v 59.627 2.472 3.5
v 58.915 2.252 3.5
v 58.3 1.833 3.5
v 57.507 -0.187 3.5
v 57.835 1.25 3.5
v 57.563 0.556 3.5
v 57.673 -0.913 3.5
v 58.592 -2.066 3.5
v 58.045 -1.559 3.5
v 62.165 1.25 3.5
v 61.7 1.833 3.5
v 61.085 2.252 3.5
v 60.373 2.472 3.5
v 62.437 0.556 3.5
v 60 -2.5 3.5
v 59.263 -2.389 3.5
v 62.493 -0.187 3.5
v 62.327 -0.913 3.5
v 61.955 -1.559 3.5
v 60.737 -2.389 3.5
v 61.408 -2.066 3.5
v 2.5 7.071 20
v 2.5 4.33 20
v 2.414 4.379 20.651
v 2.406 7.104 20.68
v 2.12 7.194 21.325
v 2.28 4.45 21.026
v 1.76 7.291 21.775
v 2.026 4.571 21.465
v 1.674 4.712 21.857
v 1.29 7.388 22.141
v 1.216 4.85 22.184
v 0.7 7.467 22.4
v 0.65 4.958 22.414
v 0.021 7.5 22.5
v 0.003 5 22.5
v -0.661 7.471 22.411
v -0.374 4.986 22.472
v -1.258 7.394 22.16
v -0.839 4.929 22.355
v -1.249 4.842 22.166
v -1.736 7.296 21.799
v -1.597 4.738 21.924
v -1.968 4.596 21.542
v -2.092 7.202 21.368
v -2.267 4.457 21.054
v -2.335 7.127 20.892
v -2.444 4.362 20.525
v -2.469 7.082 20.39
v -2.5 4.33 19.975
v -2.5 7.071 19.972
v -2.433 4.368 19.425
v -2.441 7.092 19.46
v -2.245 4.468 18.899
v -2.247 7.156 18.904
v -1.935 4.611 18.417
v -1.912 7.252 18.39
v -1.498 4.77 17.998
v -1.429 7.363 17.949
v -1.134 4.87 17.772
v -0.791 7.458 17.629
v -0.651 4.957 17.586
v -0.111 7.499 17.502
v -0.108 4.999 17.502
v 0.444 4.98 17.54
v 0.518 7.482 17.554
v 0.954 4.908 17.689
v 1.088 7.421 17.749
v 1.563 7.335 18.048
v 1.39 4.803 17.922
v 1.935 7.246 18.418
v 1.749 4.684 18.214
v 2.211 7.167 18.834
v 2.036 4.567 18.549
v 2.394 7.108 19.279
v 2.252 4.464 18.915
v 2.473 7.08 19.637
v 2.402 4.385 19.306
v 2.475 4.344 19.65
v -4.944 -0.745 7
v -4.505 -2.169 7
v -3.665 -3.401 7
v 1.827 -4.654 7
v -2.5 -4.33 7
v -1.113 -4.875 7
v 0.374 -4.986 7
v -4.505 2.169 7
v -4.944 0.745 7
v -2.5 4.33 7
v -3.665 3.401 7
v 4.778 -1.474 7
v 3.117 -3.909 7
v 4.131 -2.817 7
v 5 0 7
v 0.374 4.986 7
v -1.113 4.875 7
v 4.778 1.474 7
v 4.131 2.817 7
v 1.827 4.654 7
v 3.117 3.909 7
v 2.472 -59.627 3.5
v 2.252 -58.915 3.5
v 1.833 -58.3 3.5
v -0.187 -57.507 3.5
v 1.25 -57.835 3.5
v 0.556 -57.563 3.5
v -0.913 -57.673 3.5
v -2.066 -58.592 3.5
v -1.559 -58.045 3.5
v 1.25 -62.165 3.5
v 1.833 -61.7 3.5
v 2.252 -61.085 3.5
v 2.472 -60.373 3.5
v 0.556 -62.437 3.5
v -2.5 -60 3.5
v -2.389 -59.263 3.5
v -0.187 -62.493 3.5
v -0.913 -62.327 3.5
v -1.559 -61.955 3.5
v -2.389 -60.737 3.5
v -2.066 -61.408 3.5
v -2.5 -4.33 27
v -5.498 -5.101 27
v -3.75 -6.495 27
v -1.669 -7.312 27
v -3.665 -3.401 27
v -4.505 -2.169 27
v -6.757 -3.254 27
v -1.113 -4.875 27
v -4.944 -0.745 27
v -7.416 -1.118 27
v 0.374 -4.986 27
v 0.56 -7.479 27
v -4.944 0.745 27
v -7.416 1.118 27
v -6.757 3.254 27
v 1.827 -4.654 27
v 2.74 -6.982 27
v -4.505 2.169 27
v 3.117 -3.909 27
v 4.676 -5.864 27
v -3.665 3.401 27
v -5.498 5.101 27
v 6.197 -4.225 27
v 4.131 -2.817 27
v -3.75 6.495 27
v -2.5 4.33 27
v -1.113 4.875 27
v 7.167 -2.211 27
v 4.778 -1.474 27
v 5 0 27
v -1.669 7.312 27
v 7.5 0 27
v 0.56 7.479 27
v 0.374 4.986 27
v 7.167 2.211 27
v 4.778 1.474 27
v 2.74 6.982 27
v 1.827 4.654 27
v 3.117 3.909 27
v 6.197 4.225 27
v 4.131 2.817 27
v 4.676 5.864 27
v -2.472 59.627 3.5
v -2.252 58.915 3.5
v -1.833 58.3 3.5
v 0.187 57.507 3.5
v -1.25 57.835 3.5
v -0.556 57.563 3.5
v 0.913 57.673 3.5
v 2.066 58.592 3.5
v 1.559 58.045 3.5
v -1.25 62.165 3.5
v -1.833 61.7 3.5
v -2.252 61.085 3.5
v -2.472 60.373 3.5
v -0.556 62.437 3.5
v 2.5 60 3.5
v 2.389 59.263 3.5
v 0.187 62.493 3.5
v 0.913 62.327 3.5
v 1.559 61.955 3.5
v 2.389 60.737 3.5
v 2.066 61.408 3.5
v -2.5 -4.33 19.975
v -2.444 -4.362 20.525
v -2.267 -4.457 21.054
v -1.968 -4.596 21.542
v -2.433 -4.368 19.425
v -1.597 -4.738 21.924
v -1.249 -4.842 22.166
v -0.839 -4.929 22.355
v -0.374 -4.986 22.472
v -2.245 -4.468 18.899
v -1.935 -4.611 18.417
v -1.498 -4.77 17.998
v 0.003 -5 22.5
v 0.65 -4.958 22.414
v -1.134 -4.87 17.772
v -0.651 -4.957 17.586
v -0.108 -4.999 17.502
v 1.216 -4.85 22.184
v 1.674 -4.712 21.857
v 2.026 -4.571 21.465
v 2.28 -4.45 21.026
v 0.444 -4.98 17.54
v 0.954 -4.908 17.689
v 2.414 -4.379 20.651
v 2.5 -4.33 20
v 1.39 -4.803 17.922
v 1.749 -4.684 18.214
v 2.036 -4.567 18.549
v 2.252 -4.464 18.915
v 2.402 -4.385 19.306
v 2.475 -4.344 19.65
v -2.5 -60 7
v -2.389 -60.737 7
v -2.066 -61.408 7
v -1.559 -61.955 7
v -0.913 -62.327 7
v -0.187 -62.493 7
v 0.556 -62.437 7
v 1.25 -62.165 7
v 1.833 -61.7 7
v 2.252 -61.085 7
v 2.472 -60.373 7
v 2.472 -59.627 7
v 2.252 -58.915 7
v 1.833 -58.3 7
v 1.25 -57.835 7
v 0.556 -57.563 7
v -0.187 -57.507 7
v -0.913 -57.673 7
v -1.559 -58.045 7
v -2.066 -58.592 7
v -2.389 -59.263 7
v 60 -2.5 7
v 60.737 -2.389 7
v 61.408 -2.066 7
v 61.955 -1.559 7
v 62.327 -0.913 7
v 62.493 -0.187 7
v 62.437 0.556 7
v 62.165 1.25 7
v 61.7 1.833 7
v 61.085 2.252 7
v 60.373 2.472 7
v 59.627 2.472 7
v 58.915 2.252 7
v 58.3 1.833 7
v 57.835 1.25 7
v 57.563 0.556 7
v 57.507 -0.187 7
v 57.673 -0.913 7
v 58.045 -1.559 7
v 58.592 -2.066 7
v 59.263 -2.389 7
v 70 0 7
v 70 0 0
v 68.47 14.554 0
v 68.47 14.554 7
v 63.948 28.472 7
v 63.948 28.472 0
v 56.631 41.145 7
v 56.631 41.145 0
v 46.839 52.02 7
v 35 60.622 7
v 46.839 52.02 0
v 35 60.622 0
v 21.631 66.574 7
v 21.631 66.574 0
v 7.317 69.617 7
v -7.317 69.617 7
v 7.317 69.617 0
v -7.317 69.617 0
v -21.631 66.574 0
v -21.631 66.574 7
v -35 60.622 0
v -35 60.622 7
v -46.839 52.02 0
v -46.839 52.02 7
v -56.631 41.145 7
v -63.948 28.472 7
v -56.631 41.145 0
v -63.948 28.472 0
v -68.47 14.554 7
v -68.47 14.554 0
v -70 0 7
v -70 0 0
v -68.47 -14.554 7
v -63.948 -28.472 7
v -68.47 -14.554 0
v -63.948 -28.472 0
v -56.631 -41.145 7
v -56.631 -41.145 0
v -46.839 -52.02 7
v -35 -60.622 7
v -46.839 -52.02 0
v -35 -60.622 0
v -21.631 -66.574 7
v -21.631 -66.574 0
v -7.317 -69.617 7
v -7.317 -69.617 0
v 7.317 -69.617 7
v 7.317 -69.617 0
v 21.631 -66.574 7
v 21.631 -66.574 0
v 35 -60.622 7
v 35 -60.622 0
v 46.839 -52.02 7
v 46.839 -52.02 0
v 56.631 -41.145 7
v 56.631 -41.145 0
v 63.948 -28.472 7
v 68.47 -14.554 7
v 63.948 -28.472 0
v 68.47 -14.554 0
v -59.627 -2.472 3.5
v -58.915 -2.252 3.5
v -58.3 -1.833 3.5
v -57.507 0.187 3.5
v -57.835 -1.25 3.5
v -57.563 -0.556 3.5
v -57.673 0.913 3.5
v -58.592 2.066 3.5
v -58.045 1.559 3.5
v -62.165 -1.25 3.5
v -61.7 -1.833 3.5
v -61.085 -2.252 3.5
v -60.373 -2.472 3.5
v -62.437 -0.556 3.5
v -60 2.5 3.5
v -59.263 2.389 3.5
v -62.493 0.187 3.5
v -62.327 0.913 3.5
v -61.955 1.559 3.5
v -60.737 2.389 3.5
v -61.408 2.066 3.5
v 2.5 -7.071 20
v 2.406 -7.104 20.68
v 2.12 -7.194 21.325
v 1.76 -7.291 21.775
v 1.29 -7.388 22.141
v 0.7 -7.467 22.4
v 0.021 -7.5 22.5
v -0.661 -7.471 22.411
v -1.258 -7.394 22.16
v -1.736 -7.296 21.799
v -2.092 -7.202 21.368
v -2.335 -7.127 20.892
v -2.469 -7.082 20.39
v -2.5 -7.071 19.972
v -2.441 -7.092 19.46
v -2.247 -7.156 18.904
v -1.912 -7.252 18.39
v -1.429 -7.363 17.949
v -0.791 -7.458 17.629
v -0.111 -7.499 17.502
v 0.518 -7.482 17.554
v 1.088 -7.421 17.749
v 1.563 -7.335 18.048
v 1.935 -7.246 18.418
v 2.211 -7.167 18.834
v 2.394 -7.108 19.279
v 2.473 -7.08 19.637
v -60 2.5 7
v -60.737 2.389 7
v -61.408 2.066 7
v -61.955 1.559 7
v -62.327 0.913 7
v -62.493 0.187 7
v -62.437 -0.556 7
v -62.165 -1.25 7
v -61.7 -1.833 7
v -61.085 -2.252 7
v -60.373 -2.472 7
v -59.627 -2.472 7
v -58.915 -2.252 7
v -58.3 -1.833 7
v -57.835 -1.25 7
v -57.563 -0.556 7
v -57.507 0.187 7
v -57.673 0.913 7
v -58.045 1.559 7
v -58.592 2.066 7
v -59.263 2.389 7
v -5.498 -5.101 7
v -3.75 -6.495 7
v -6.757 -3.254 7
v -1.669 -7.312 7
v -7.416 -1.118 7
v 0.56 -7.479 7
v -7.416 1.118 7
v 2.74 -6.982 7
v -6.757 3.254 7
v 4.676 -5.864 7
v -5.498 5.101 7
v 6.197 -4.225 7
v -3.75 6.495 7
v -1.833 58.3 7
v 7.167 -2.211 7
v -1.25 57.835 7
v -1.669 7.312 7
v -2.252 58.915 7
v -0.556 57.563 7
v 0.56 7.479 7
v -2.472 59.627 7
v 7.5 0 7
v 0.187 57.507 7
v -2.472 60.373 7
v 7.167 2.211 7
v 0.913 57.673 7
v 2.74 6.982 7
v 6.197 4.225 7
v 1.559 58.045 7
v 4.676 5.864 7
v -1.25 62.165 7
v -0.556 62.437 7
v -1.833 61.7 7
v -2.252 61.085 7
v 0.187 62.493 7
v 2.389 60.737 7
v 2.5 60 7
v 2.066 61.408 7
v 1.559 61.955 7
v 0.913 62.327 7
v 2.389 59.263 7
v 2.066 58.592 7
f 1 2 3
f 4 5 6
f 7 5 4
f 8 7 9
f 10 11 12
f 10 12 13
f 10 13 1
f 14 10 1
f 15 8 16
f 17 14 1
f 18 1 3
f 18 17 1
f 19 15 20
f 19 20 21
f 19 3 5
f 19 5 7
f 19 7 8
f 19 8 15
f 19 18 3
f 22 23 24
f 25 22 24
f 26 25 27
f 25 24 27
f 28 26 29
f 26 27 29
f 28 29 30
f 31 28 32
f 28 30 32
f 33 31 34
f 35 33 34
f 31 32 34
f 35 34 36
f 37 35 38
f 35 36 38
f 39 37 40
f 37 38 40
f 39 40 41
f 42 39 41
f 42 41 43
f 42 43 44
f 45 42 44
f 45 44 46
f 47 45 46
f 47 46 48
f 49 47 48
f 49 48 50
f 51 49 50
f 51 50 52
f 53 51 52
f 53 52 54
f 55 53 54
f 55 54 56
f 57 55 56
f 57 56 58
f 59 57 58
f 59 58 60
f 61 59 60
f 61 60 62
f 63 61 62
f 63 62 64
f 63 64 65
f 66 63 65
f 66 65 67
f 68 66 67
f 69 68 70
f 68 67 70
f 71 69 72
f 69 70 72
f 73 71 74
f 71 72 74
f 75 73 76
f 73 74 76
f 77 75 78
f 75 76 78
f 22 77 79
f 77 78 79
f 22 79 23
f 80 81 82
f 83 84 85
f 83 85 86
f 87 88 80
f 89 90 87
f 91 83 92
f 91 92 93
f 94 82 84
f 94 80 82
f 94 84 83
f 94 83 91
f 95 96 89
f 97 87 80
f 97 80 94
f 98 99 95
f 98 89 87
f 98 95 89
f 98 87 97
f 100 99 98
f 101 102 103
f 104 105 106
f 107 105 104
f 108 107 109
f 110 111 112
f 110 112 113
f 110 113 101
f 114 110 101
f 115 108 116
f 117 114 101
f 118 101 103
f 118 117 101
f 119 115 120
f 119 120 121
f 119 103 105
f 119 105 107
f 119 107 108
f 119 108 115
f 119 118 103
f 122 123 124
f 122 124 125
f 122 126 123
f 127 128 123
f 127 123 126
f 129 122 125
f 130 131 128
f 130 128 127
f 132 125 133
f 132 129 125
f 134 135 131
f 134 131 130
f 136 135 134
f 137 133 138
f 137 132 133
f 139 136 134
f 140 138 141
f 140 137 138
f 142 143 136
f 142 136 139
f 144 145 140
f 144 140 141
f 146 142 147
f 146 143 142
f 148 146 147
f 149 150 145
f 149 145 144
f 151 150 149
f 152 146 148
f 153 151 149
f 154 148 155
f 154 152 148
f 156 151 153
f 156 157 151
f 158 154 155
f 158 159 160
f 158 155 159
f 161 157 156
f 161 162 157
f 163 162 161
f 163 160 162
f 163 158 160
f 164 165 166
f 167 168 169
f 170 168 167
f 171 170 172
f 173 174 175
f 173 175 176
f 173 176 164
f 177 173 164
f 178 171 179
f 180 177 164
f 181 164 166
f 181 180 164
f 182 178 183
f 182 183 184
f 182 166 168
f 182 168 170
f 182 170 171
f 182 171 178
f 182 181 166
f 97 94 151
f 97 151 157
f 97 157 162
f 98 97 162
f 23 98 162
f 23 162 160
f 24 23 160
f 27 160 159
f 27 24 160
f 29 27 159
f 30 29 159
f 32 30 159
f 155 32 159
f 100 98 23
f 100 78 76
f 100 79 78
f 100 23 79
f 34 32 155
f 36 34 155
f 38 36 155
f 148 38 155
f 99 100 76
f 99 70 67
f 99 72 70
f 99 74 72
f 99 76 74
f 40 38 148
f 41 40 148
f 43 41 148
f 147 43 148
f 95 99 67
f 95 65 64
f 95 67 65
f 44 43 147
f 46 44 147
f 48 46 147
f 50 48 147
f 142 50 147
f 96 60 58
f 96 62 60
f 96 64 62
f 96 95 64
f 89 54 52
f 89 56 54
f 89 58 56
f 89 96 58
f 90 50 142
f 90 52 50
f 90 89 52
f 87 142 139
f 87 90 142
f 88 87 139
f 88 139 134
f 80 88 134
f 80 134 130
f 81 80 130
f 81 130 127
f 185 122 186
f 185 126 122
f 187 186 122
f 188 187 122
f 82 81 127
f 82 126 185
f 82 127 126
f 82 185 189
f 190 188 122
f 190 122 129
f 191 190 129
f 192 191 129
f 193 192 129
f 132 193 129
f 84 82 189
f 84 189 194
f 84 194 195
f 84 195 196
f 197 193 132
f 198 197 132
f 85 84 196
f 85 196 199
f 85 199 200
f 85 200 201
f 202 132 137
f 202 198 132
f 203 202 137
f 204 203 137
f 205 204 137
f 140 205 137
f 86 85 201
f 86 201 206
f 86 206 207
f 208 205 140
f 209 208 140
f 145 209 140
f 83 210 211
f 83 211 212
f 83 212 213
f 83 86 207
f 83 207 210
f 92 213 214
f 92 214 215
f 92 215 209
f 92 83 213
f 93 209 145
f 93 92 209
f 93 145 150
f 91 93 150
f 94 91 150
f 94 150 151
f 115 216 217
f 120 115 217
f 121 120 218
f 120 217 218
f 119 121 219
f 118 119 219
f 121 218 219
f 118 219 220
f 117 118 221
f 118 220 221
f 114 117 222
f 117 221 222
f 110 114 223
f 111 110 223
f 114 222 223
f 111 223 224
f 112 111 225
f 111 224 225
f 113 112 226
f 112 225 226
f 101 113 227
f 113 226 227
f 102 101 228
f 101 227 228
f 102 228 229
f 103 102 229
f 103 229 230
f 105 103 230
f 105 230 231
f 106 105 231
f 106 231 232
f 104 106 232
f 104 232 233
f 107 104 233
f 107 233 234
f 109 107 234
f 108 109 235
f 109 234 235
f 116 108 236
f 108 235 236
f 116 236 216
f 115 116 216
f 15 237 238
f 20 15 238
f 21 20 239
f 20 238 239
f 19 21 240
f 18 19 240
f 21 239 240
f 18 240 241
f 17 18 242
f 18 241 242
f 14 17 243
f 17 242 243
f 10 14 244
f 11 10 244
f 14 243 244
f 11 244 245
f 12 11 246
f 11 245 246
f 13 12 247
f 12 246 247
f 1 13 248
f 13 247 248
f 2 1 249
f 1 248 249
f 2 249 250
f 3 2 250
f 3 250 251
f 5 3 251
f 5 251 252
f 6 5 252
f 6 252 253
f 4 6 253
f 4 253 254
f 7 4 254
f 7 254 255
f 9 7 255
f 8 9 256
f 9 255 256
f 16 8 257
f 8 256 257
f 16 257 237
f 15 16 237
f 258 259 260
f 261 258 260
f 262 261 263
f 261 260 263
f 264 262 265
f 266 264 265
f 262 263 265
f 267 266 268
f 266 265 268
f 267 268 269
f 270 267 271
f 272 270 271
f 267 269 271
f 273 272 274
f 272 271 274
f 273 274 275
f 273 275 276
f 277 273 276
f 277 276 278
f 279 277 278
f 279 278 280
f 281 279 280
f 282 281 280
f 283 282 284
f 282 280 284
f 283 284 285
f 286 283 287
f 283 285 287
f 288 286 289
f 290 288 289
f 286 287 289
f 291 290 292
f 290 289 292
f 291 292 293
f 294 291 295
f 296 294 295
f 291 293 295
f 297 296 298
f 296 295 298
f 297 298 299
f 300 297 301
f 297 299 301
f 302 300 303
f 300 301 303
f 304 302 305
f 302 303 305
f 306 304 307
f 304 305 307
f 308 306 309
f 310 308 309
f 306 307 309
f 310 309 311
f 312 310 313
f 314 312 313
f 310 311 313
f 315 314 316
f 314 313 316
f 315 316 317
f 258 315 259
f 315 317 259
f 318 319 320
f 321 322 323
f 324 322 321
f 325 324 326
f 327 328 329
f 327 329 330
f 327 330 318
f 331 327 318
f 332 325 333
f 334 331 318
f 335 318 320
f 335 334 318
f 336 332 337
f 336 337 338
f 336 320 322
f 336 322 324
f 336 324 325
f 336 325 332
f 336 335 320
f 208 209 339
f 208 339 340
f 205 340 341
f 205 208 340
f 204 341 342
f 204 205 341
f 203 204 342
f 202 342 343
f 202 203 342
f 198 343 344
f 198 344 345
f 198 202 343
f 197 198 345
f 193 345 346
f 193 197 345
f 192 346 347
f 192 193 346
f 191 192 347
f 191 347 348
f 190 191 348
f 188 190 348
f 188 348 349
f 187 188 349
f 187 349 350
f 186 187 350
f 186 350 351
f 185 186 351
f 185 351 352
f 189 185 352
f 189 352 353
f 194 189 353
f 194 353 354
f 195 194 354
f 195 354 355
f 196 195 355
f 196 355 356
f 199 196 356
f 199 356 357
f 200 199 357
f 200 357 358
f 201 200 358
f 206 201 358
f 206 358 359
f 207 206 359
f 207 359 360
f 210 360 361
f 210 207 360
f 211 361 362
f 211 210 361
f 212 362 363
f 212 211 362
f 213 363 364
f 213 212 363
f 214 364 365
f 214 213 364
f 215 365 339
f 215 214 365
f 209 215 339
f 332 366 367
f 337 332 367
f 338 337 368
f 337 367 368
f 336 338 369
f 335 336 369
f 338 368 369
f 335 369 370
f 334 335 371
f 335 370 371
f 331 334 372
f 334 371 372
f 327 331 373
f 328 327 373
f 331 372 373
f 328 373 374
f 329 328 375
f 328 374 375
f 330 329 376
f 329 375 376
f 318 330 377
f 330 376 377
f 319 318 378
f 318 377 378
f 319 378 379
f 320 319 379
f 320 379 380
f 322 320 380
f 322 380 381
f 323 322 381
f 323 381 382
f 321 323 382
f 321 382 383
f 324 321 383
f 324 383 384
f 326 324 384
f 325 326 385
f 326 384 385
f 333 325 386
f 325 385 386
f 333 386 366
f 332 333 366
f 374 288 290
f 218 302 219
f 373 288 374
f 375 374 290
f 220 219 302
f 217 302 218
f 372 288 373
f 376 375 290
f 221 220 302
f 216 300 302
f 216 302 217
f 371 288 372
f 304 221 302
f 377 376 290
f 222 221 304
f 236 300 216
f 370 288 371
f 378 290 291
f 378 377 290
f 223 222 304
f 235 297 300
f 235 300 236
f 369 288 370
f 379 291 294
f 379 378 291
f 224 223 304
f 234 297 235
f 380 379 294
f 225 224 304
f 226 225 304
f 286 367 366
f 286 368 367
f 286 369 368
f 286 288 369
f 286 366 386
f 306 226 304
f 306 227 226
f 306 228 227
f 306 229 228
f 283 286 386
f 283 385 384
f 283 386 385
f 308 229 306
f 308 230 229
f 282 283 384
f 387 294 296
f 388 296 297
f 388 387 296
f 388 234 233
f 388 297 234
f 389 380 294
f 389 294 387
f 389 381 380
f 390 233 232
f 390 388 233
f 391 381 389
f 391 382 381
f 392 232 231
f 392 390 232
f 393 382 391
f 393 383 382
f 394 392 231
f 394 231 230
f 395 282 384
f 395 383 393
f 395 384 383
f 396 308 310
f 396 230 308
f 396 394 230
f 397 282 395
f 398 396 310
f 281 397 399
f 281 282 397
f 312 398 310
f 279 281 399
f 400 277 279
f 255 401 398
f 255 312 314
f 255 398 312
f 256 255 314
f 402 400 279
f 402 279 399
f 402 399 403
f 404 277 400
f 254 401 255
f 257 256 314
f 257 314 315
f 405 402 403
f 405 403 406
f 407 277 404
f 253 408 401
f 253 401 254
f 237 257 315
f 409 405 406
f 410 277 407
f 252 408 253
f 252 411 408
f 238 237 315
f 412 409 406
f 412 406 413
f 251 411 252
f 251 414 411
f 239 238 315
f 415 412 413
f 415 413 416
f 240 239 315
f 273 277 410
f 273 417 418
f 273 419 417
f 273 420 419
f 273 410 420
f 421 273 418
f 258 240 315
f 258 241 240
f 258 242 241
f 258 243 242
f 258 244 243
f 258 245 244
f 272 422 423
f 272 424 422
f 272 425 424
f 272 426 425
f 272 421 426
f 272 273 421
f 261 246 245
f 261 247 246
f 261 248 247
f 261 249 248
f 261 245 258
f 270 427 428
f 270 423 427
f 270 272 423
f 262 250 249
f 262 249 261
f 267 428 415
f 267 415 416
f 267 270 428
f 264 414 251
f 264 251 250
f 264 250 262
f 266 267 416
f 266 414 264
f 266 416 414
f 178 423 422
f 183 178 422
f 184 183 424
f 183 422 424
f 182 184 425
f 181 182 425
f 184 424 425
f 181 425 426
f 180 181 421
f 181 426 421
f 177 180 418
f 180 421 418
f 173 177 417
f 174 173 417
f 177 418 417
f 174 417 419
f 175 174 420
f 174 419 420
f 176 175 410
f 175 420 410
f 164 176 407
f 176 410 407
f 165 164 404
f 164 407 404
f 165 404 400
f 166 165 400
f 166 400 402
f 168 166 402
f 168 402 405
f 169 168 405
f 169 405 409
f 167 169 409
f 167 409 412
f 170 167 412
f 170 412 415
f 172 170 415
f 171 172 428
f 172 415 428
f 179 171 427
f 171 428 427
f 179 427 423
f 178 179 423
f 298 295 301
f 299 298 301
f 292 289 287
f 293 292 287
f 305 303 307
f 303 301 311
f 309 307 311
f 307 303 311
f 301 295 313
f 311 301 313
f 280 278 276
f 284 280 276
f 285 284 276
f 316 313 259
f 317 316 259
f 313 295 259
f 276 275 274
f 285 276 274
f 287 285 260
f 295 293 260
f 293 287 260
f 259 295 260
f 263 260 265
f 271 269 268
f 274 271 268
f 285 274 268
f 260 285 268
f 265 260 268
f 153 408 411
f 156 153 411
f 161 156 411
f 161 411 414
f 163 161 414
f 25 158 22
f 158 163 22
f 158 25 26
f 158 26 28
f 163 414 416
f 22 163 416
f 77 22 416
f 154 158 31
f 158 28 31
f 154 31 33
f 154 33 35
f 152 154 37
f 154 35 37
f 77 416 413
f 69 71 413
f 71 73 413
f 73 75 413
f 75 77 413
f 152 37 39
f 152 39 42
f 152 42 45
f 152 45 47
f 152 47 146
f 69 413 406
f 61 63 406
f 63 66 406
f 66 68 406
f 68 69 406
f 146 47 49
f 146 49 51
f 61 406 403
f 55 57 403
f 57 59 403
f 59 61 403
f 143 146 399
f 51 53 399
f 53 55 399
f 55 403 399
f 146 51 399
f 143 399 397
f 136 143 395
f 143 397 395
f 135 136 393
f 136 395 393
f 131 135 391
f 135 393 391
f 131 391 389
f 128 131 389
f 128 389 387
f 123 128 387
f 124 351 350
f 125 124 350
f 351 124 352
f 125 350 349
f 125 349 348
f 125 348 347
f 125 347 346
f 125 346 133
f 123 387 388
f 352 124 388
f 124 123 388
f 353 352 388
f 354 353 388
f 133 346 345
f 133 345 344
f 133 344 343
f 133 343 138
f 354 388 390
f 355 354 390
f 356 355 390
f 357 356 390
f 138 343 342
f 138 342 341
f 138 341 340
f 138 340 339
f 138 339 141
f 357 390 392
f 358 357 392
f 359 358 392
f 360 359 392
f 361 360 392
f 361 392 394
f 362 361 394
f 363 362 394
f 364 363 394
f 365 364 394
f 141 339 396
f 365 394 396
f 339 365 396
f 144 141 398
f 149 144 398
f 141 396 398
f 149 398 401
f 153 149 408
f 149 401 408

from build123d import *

# Parameters (mm, degrees)
SKETCH018_R          = 70
PAD010_DEPTH         = 7
SKETCH019_R          = 2.5
POCKET_DEPTH         = 3.5
POLARPATTERN_COUNT   = 4
SKETCH_R             = 7.5
SKETCH_R_2           = 5
PAD_DEPTH            = 20
SKETCH020_R          = 2.5
POCKET005_DEPTH      = 70.001
POCKET005_DEPTH_BACK = 70.001


with BuildPart() as part:
    # Sketch018 → Pad010 (new body)
    with BuildSketch(Plane.XY):
        Circle(SKETCH018_R)
    extrude(amount=PAD010_DEPTH)

    # Sketch019 → Pocket (cut)
    with BuildSketch(Plane.XY.offset(7)):
        with Locations((0, 60)):
            Circle(SKETCH019_R)
    pocket = extrude(amount=-POCKET_DEPTH, mode=Mode.SUBTRACT)

    # PolarPattern: Pocket ×4 about axis
    polarpattern_axis = Axis((0, 0, 7), (0, 0, 1))
    for i in range(1, POLARPATTERN_COUNT):
        add(pocket.rotate(polarpattern_axis, i * 360 / POLARPATTERN_COUNT), mode=Mode.SUBTRACT)

    # Sketch (on Face3 of PolarPattern) → Pad (join)
    with BuildSketch(Plane.XY.offset(7)):
        Circle(SKETCH_R)
        Circle(SKETCH_R_2, mode=Mode.SUBTRACT)
    extrude(amount=PAD_DEPTH)

    # Sketch020 → Pocket005 (cut, two sides)
    with BuildSketch(Plane.XZ) as pocket005_sk:
        with Locations((0, 20)):
            Circle(SKETCH020_R)
    extrude(amount=-POCKET005_DEPTH, mode=Mode.SUBTRACT)
    extrude(pocket005_sk.sketch, amount=POCKET005_DEPTH_BACK, mode=Mode.SUBTRACT)


solid = part.part
